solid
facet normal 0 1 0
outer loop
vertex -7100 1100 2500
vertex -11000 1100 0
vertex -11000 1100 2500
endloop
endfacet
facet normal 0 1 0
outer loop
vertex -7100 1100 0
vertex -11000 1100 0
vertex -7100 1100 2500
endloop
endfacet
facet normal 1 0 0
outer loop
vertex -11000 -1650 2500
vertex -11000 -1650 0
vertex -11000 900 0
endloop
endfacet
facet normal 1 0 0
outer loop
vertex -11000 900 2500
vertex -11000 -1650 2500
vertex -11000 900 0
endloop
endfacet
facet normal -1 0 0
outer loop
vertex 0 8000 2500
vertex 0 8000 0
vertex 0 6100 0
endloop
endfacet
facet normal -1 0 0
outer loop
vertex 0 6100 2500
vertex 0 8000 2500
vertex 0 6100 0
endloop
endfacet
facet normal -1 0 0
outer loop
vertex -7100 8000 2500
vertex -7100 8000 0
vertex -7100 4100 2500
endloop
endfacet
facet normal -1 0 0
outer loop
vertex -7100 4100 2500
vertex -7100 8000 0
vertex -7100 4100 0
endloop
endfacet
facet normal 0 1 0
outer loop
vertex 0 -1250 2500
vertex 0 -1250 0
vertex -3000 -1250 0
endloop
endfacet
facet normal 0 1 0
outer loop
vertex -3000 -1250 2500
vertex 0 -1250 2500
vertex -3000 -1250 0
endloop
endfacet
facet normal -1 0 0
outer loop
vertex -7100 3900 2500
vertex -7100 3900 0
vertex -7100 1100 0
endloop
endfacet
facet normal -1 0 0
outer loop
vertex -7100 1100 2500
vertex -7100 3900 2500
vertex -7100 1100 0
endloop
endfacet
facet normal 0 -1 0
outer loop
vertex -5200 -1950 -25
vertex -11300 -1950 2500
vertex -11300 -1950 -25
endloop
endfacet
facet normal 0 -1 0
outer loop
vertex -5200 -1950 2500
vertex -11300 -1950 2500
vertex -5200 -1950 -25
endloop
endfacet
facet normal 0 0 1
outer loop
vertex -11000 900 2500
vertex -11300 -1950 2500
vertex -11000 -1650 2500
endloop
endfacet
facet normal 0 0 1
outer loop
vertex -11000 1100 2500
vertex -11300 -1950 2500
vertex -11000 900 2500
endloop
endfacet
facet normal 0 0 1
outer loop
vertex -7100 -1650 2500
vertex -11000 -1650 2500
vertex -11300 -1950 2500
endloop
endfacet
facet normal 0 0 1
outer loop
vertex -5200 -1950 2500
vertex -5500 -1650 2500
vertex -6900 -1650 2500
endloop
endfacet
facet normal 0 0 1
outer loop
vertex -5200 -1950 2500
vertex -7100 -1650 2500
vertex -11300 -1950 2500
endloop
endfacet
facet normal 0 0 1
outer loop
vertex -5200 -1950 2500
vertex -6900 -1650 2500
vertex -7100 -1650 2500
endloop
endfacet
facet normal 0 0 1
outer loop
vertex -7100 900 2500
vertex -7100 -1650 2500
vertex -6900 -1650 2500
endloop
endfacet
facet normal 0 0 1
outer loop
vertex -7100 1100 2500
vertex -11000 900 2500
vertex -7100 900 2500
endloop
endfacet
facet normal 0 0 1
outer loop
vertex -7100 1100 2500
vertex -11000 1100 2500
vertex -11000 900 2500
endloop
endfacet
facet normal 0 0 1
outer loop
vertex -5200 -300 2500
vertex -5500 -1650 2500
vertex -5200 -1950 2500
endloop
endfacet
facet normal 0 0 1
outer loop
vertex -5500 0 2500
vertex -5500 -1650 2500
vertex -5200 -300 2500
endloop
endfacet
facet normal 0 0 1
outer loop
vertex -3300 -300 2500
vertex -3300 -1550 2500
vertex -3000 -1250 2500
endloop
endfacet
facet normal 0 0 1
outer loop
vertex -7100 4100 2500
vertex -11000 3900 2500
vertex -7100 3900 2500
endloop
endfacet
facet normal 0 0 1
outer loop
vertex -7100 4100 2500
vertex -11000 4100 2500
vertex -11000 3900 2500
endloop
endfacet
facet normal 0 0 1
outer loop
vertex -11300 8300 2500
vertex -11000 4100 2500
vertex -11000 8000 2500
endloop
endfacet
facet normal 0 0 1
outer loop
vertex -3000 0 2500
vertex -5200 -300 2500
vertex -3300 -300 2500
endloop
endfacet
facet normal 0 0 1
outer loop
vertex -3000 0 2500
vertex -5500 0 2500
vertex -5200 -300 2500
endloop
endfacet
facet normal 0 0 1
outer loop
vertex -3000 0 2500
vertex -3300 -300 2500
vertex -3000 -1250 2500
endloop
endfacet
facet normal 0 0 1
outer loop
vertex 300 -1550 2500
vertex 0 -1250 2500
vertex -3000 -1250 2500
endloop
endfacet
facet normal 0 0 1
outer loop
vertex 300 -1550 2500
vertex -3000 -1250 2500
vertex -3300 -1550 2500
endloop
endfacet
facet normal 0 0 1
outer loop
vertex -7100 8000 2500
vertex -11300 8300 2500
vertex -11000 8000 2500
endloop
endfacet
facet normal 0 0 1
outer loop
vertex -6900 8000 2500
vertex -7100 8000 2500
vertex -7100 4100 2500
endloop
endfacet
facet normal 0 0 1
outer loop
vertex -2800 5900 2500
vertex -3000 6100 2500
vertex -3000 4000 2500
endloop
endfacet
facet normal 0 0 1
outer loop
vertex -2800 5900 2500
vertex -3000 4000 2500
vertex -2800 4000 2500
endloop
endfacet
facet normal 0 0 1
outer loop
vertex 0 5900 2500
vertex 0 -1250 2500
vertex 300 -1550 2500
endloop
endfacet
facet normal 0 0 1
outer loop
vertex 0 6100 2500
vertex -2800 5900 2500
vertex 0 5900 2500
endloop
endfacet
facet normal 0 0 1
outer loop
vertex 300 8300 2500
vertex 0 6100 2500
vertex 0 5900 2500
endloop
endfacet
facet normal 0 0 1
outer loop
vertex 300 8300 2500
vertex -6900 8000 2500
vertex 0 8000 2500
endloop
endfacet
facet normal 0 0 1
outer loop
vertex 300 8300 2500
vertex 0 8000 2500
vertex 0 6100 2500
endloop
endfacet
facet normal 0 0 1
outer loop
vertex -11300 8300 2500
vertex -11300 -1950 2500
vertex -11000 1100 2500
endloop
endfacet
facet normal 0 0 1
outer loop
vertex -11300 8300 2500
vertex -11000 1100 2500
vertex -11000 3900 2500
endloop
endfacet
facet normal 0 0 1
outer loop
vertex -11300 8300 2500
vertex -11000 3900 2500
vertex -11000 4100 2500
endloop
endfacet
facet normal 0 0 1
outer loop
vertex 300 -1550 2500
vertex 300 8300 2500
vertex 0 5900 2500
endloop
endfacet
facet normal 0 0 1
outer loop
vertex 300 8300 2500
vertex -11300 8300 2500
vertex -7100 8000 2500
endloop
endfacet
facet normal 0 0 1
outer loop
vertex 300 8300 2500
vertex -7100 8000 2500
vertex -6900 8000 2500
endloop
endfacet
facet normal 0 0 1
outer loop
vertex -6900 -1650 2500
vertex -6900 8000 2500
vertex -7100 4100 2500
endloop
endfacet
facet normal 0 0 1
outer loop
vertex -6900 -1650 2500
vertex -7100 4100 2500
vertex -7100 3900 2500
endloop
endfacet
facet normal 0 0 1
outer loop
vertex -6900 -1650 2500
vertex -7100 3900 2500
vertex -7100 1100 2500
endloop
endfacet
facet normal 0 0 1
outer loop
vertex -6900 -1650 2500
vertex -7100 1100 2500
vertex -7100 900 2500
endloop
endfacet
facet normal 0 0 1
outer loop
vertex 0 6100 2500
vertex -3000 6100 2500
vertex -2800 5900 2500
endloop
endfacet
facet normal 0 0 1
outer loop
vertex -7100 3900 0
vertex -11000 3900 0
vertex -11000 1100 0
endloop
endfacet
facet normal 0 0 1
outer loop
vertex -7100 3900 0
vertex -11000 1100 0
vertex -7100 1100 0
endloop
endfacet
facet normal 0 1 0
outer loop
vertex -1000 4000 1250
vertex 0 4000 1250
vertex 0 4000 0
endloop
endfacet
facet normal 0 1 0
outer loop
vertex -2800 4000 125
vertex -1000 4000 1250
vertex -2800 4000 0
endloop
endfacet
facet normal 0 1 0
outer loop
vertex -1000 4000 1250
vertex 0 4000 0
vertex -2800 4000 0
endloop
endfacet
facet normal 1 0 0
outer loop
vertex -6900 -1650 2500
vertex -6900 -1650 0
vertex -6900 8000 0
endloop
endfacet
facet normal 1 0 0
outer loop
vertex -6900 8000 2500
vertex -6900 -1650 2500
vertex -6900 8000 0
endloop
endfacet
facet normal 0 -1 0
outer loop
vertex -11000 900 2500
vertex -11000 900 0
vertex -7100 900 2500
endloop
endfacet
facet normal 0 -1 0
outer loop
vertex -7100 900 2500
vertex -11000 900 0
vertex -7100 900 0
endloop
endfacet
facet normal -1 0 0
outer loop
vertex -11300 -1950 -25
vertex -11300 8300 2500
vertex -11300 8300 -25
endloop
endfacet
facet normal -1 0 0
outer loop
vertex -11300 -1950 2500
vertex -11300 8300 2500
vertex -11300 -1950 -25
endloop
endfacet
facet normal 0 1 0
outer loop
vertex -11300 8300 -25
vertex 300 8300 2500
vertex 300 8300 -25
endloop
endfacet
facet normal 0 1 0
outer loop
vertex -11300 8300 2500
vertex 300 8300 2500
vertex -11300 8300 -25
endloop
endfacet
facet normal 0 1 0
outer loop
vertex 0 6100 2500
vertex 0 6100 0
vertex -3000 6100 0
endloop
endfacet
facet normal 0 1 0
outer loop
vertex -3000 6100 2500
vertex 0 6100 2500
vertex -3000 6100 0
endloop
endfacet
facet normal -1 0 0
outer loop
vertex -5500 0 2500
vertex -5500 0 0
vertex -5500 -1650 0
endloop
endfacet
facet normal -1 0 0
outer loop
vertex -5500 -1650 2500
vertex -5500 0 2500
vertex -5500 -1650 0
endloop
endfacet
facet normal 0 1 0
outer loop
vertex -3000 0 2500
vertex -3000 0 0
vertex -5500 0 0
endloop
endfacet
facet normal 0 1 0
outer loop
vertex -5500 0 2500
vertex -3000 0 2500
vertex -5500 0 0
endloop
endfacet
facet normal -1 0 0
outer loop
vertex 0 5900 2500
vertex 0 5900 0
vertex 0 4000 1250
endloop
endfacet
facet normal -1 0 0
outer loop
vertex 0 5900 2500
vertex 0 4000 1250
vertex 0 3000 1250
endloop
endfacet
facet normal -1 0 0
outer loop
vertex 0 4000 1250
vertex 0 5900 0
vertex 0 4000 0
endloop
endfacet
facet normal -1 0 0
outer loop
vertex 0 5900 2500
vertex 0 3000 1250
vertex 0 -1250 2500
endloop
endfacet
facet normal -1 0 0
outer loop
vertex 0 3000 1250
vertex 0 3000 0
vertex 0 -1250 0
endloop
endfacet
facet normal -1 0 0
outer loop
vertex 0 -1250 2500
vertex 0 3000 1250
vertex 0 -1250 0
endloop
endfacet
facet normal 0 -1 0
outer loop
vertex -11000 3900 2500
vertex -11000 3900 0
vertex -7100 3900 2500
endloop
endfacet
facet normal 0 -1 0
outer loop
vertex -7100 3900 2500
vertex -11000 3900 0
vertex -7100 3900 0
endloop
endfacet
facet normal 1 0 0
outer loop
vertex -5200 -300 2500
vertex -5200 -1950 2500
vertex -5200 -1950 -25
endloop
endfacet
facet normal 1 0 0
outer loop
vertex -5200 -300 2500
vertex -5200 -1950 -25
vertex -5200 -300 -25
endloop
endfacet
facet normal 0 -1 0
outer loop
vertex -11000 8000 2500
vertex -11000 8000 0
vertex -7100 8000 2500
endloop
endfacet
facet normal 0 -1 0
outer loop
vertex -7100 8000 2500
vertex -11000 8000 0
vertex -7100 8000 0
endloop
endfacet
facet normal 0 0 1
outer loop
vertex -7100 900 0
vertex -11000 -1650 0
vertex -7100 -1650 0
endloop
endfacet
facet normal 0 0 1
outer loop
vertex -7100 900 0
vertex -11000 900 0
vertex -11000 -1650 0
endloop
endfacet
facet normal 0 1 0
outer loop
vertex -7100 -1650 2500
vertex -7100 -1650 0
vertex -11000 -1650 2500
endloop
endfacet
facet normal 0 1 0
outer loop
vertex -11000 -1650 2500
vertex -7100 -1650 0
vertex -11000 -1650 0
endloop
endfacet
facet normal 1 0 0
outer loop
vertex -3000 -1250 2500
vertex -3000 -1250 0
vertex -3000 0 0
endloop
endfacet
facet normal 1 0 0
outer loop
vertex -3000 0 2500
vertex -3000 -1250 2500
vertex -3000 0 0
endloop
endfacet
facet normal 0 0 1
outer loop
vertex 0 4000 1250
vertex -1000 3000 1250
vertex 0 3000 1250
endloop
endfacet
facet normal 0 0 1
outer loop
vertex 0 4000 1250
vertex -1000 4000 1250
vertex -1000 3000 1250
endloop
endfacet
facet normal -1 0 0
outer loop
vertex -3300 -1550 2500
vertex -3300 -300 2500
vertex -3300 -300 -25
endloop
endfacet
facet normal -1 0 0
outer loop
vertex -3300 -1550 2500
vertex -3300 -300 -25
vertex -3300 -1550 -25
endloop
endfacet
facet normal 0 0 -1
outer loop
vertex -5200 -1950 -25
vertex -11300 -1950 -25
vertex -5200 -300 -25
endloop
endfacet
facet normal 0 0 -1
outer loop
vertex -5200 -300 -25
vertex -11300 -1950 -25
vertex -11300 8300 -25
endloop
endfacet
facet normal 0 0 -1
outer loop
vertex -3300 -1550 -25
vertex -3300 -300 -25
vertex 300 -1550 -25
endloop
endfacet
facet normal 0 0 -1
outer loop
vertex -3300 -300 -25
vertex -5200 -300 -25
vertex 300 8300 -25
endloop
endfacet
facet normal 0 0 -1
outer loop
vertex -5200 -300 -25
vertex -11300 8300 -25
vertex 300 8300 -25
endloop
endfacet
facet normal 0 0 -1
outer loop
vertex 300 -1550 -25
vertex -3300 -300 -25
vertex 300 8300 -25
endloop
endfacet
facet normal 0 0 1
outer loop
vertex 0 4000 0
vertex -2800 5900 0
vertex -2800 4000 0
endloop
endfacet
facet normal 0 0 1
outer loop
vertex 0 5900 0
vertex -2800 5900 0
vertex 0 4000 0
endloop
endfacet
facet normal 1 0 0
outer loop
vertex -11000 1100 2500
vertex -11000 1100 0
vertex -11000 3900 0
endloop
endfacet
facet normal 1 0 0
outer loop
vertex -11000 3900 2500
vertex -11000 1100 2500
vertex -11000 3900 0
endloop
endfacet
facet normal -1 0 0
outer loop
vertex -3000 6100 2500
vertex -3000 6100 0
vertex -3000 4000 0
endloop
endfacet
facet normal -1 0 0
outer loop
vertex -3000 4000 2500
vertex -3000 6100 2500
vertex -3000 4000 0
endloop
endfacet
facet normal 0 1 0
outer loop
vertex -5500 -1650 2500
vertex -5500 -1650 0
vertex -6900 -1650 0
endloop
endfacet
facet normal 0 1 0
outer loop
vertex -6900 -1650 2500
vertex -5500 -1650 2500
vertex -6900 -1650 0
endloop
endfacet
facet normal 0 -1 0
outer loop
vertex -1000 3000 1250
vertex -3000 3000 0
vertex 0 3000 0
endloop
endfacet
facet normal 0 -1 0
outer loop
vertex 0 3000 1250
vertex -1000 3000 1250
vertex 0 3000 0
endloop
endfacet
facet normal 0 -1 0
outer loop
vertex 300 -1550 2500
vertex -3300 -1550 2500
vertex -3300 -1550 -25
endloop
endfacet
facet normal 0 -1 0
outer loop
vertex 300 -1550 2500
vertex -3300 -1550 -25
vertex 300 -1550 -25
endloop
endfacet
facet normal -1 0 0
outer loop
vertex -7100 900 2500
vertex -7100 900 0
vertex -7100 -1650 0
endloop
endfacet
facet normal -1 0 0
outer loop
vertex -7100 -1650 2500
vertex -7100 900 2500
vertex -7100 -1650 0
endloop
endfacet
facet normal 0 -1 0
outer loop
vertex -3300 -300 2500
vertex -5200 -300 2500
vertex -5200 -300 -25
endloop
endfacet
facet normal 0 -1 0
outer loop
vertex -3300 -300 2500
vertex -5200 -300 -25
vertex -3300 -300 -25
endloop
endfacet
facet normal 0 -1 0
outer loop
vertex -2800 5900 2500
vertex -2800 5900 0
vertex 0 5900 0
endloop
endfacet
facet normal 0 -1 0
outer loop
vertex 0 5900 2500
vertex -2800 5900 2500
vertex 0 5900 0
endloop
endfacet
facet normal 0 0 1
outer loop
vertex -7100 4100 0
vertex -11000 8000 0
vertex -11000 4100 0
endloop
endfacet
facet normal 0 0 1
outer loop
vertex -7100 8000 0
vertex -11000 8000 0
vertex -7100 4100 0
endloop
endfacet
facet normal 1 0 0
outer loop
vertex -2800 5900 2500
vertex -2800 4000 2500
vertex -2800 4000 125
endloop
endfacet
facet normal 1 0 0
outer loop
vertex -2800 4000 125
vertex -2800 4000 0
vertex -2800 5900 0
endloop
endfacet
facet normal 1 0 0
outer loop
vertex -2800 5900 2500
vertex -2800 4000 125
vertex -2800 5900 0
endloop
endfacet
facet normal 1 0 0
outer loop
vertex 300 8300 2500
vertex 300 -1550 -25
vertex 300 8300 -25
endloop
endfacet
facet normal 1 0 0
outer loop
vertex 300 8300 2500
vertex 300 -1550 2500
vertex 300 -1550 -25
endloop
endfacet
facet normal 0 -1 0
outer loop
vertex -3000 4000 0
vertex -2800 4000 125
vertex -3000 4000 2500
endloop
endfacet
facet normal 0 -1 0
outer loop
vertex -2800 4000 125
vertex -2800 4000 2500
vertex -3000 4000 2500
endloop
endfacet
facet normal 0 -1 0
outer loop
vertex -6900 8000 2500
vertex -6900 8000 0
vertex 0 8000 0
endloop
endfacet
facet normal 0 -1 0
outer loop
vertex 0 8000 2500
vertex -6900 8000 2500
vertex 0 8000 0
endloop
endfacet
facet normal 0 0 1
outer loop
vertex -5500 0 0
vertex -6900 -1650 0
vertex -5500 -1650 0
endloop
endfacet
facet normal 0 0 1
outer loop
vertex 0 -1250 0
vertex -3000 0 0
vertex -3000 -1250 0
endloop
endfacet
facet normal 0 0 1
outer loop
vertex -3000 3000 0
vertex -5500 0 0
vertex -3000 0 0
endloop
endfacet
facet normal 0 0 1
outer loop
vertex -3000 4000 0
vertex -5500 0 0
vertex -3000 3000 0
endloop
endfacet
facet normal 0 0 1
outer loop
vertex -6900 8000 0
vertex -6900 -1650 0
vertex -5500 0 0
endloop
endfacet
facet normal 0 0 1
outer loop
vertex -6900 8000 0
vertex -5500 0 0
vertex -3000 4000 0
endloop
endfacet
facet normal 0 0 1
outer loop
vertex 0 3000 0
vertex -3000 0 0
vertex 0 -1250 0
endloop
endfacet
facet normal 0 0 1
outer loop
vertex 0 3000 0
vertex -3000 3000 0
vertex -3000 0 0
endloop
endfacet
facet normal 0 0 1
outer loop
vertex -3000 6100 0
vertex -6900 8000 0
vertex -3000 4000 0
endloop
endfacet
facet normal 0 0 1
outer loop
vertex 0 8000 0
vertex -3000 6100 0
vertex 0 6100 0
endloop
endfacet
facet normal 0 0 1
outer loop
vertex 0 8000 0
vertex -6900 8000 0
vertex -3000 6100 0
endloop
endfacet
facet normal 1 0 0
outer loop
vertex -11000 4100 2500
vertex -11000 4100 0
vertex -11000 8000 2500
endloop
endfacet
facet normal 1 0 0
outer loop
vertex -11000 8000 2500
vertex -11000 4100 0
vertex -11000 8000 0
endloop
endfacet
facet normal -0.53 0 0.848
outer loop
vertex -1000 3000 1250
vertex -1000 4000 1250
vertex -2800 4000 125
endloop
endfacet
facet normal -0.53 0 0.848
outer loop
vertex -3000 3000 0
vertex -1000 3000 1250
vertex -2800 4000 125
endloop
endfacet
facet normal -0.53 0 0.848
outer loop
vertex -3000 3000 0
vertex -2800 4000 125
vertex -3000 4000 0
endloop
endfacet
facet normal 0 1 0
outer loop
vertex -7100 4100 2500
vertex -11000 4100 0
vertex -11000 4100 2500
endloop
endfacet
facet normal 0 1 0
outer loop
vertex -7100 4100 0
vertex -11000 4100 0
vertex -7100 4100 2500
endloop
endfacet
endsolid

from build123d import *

# Parameters (mm, degrees)
F0_W        = 3900
F0_H        = 200
F1_DEPTH    = 2500
F0_H_2      = 3900
F0_H_3      = 2800
F2_DEPTH    = 25
F3_W        = 1000
F3_H        = 1000
F4_DEPTH    = 1250
F5_T4_DEPTH = 6170.686280177


# Not quite as in the source:
# - a fillet or chamfer that OpenCascade refuses, or shapes differently, is made with other operations: its cross-section is extruded or revolved along the edge and cut away or added


with BuildPart() as f1:
    # F0 (on Top) → F1 (new body)
    with BuildSketch(Plane.XY):
        Polygon((-11300, 8300), (-11300, 2877.939863491), (-11300, -1950), (-5200, -1950), (-5200, -300), (-3300, -300), (-3300, -1550), (300, -1550), (300, 2832.2768892759), (300, 8300), align=None)
        Polygon((-3000, -1250), (-3000, 0), (-5500, 0), (-5500, -1650), (-6900, -1650), (-7100, -1650), (-11000, -1650), (-11000, 0), (-11000, 900), (-11000, 1100), (-11000, 3900), (-11000, 4100), (-11000, 8000), (-7100, 8000), (-6900, 8000), (0, 8000), (0, 6100), (0, 5900), (0, 0), (0, -1250), align=None, mode=Mode.SUBTRACT)
        Polygon((-7100, -1650), (-6900, -1650), (-6900, 8000), (-7100, 8000), (-7100, 4100), (-7100, 3900), (-7100, 1100), (-7100, 900), align=None)
        with Locations((-9050, 4000)):
            Rectangle(F0_W, F0_H)
        with Locations((-9050, 1000)):
            Rectangle(F0_W, F0_H)
        Polygon((-2800, 5900), (0, 5900), (0, 6100), (-3000, 6100), (-3000, 4000), (-2800, 4000), align=None)
    extrude(amount=F1_DEPTH)

    # F0 (on Top) → F2 (join)
    with BuildSketch(Plane.XY):
        Polygon((-11300, 8300), (-11300, 2877.939863491), (-11300, -1950), (-5200, -1950), (-5200, -300), (-3300, -300), (-3300, -1550), (300, -1550), (300, 2832.2768892759), (300, 8300), align=None)
        Polygon((-3000, -1250), (-3000, 0), (-5500, 0), (-5500, -1650), (-6900, -1650), (-7100, -1650), (-11000, -1650), (-11000, 0), (-11000, 900), (-11000, 1100), (-11000, 3900), (-11000, 4100), (-11000, 8000), (-7100, 8000), (-6900, 8000), (0, 8000), (0, 6100), (0, 5900), (0, 0), (0, -1250), align=None, mode=Mode.SUBTRACT)
        with Locations((-9050, 1000)):
            Rectangle(F0_W, F0_H)
        with Locations((-9050, 4000)):
            Rectangle(F0_W, F0_H)
        Polygon((-7100, -1650), (-6900, -1650), (-6900, 8000), (-7100, 8000), (-7100, 4100), (-7100, 3900), (-7100, 1100), (-7100, 900), align=None)
        Polygon((-2800, 5900), (0, 5900), (0, 6100), (-3000, 6100), (-3000, 4000), (-2800, 4000), align=None)
        Polygon((-5500, 0), (-3000, 0), (-3000, -1250), (0, -1250), (0, 0), (0, 5900), (-2800, 5900), (-2800, 4000), (-3000, 4000), (-3000, 6100), (0, 6100), (0, 8000), (-6900, 8000), (-6900, -1650), (-5500, -1650), align=None)
        with Locations((-9050, 6050)):
            Rectangle(F0_W, F0_H_2)
        with Locations((-9050, 2500)):
            Rectangle(F0_W, F0_H_3)
        Polygon((-11000, -1650), (-7100, -1650), (-7100, 900), (-11000, 900), (-11000, 0), align=None)
    extrude(amount=-F2_DEPTH)

    # F3 (on face) → F4 (join)
    with BuildSketch(Plane.XY):
        with Locations((-500, 3500)):
            Rectangle(F3_W, F3_H)
        Polygon((-3000, 3000), (-1000, 3000), (-1000, 4000), (-2800, 4000), (-3000, 4000), align=None)
    extrude(amount=F4_DEPTH)

    # F5: chamfer of 1250 x 2000 on 1 edges, made by hand


with BuildPart() as f5_tool2:
    # F5_s3 → F5_t4 (new body)
    with BuildSketch(Plane.XZ.offset(-4000)):
        Polygon((-1000, 1250), (-3000, 0), (-3000, 1250), align=None)
    extrude(amount=F5_T4_DEPTH)

    split(bisect_by=Plane.XZ, keep=Keep.BOTTOM)


with BuildPart() as f1_1:
    add(f1.part)

    # F5_t1: cut F5_tool2
    add(f5_tool2.part, mode=Mode.SUBTRACT)


solid = f1_1.part
